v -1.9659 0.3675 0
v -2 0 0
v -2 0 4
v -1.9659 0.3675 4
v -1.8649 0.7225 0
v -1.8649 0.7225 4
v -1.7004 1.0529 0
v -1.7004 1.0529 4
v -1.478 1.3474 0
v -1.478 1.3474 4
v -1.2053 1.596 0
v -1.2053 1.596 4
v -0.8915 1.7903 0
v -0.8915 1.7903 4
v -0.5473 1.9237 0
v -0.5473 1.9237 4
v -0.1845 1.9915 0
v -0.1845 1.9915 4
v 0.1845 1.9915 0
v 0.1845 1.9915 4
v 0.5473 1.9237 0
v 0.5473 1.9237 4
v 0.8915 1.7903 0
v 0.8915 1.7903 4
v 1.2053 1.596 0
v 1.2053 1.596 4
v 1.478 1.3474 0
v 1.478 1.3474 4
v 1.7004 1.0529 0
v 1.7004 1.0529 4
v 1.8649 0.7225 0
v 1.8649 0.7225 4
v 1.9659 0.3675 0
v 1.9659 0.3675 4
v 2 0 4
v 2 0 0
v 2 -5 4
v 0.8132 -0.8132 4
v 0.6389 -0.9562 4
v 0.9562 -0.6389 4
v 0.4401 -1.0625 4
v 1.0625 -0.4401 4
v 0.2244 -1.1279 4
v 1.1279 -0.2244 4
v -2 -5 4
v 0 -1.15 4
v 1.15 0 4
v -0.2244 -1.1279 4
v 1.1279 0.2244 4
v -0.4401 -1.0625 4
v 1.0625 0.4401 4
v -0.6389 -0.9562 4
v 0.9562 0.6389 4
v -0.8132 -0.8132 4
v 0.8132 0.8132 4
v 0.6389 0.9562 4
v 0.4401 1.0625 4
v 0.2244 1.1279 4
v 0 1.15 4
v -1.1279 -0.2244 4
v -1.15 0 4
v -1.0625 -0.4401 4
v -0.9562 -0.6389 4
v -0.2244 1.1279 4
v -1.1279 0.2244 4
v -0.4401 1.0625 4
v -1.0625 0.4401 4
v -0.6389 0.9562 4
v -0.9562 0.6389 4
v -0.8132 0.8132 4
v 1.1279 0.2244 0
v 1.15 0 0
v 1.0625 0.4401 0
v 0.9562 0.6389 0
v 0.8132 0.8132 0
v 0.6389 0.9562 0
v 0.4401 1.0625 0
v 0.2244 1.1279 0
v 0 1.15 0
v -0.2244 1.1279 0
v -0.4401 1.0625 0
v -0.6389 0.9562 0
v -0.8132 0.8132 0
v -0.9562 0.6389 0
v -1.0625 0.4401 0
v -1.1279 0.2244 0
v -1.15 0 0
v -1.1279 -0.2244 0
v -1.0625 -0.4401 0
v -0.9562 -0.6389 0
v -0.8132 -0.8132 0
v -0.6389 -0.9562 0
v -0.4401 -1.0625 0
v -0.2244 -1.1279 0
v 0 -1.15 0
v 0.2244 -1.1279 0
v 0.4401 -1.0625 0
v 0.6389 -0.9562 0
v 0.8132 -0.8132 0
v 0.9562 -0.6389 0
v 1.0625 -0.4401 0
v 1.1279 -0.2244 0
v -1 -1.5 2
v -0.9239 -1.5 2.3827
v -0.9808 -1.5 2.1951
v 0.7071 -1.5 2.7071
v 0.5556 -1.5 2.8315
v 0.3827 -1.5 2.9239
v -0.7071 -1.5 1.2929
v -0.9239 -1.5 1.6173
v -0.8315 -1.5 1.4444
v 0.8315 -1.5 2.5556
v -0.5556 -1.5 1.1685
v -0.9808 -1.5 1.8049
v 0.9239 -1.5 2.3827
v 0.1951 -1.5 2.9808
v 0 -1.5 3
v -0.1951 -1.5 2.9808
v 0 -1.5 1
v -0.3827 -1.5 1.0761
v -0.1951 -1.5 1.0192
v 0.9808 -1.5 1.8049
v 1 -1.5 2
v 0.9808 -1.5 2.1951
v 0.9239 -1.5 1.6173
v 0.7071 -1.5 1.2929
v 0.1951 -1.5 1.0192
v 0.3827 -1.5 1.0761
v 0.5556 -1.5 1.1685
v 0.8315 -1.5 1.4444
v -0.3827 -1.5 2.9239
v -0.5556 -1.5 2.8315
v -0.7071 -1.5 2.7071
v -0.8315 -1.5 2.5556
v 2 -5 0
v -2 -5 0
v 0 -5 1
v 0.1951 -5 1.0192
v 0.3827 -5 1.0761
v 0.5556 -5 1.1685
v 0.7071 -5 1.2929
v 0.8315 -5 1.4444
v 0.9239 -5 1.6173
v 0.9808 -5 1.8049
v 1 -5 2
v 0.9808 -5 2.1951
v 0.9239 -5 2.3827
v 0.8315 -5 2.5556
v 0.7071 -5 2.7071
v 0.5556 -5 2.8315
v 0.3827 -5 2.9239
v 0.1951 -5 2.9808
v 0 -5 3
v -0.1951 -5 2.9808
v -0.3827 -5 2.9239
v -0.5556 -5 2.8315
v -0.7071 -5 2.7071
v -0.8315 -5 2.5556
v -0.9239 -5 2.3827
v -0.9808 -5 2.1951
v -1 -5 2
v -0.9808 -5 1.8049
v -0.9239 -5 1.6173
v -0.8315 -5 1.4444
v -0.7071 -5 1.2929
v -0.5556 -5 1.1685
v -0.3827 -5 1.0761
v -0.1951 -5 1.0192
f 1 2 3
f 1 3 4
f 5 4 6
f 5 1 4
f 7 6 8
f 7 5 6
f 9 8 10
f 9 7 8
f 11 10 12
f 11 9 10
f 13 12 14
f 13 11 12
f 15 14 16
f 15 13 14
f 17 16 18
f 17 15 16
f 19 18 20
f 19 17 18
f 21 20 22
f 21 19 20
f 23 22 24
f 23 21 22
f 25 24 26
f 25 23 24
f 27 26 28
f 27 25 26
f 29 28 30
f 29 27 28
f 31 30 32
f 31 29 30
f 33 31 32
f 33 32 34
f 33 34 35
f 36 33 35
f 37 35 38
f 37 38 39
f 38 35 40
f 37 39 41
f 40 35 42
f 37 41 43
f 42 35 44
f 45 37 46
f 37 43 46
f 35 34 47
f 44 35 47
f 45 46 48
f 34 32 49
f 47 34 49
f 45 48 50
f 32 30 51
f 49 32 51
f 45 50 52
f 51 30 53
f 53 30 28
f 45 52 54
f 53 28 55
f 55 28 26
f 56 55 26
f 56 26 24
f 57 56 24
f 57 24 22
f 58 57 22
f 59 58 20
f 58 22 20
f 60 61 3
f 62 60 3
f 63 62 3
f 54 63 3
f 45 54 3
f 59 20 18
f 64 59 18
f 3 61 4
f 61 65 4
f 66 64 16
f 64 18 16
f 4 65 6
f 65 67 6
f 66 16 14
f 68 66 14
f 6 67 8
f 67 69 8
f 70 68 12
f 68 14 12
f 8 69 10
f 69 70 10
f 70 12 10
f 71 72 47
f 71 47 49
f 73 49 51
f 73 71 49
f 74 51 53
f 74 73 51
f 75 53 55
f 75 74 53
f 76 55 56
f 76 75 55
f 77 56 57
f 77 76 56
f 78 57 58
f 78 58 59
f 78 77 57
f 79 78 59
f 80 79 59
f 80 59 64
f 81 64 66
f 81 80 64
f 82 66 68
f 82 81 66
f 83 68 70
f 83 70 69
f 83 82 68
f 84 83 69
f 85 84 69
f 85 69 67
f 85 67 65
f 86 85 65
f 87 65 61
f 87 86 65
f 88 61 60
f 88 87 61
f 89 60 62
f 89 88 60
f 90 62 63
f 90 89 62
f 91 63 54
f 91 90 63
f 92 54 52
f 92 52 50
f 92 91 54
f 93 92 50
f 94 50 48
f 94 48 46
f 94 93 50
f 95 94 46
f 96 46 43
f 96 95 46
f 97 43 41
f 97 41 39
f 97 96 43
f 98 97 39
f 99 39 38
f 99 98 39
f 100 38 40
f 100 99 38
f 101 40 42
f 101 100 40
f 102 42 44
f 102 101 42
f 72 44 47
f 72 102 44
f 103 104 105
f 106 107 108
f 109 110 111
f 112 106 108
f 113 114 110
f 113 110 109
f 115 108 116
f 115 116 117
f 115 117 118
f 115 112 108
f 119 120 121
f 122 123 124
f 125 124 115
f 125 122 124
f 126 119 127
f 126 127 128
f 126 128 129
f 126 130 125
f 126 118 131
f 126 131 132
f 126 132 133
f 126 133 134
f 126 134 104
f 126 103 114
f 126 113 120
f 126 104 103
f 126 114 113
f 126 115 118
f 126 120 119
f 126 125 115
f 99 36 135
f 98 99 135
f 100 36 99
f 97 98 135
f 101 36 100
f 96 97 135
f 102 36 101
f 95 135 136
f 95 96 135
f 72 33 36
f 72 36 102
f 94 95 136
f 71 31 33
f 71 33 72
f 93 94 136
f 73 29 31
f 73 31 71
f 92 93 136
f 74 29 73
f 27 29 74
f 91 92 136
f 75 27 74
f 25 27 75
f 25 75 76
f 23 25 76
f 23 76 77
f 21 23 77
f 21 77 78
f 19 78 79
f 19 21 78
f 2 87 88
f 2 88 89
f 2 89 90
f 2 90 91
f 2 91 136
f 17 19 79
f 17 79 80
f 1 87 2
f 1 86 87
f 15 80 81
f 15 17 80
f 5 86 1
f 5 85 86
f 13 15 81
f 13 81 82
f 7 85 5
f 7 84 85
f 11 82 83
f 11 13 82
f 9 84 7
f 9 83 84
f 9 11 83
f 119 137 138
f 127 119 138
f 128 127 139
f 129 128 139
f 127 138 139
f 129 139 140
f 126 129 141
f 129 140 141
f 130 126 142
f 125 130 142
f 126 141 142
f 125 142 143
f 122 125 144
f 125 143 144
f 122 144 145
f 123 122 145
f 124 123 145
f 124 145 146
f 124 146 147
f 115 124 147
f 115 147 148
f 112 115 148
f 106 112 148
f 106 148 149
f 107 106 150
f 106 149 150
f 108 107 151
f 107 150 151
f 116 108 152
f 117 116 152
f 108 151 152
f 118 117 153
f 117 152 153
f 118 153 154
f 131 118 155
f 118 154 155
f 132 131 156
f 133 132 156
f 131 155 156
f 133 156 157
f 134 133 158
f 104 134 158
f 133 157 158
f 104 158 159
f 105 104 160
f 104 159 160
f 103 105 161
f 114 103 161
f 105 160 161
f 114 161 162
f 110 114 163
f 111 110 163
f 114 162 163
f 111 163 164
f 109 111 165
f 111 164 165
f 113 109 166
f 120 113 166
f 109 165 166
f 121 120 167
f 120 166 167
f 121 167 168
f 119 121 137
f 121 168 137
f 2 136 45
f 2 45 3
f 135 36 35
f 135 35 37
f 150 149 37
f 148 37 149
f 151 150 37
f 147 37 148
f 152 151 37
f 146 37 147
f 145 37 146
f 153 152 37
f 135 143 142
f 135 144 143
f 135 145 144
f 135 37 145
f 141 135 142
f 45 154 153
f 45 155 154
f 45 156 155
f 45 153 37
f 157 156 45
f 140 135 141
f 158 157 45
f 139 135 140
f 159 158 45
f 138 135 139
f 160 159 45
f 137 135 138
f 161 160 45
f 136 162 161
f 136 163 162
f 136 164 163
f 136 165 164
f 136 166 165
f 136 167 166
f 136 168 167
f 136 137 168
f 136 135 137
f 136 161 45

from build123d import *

# Parameters (mm, degrees)
SKETCH_1_R          = 1.15
EXTRUDE_1_DEPTH     = 4
SKETCH_2_R          = 1
CUT_EXTRUDE_1_DEPTH = 3.5


with BuildPart() as part:
    # 草图1 → 凸台-拉伸1 (new body)
    with BuildSketch(Plane.XY):
        with BuildLine():
            Line((2, 0), (2, -5))
            Line((2, -5), (-2, -5))
            Line((-2, -5), (-2, 0))
            ThreePointArc((-2, 0), (0, 2), (2, 0))
        make_face()
        Circle(SKETCH_1_R, mode=Mode.SUBTRACT)
    extrude(amount=EXTRUDE_1_DEPTH)

    # 草图2 → 切除-拉伸1 (cut)
    with BuildSketch(Plane.XZ.offset(5)):
        with Locations(Location((0, 2, 0), (0, 0, 270))):
            Circle(SKETCH_2_R)
    extrude(amount=-CUT_EXTRUDE_1_DEPTH, mode=Mode.SUBTRACT)


solid = part.part
